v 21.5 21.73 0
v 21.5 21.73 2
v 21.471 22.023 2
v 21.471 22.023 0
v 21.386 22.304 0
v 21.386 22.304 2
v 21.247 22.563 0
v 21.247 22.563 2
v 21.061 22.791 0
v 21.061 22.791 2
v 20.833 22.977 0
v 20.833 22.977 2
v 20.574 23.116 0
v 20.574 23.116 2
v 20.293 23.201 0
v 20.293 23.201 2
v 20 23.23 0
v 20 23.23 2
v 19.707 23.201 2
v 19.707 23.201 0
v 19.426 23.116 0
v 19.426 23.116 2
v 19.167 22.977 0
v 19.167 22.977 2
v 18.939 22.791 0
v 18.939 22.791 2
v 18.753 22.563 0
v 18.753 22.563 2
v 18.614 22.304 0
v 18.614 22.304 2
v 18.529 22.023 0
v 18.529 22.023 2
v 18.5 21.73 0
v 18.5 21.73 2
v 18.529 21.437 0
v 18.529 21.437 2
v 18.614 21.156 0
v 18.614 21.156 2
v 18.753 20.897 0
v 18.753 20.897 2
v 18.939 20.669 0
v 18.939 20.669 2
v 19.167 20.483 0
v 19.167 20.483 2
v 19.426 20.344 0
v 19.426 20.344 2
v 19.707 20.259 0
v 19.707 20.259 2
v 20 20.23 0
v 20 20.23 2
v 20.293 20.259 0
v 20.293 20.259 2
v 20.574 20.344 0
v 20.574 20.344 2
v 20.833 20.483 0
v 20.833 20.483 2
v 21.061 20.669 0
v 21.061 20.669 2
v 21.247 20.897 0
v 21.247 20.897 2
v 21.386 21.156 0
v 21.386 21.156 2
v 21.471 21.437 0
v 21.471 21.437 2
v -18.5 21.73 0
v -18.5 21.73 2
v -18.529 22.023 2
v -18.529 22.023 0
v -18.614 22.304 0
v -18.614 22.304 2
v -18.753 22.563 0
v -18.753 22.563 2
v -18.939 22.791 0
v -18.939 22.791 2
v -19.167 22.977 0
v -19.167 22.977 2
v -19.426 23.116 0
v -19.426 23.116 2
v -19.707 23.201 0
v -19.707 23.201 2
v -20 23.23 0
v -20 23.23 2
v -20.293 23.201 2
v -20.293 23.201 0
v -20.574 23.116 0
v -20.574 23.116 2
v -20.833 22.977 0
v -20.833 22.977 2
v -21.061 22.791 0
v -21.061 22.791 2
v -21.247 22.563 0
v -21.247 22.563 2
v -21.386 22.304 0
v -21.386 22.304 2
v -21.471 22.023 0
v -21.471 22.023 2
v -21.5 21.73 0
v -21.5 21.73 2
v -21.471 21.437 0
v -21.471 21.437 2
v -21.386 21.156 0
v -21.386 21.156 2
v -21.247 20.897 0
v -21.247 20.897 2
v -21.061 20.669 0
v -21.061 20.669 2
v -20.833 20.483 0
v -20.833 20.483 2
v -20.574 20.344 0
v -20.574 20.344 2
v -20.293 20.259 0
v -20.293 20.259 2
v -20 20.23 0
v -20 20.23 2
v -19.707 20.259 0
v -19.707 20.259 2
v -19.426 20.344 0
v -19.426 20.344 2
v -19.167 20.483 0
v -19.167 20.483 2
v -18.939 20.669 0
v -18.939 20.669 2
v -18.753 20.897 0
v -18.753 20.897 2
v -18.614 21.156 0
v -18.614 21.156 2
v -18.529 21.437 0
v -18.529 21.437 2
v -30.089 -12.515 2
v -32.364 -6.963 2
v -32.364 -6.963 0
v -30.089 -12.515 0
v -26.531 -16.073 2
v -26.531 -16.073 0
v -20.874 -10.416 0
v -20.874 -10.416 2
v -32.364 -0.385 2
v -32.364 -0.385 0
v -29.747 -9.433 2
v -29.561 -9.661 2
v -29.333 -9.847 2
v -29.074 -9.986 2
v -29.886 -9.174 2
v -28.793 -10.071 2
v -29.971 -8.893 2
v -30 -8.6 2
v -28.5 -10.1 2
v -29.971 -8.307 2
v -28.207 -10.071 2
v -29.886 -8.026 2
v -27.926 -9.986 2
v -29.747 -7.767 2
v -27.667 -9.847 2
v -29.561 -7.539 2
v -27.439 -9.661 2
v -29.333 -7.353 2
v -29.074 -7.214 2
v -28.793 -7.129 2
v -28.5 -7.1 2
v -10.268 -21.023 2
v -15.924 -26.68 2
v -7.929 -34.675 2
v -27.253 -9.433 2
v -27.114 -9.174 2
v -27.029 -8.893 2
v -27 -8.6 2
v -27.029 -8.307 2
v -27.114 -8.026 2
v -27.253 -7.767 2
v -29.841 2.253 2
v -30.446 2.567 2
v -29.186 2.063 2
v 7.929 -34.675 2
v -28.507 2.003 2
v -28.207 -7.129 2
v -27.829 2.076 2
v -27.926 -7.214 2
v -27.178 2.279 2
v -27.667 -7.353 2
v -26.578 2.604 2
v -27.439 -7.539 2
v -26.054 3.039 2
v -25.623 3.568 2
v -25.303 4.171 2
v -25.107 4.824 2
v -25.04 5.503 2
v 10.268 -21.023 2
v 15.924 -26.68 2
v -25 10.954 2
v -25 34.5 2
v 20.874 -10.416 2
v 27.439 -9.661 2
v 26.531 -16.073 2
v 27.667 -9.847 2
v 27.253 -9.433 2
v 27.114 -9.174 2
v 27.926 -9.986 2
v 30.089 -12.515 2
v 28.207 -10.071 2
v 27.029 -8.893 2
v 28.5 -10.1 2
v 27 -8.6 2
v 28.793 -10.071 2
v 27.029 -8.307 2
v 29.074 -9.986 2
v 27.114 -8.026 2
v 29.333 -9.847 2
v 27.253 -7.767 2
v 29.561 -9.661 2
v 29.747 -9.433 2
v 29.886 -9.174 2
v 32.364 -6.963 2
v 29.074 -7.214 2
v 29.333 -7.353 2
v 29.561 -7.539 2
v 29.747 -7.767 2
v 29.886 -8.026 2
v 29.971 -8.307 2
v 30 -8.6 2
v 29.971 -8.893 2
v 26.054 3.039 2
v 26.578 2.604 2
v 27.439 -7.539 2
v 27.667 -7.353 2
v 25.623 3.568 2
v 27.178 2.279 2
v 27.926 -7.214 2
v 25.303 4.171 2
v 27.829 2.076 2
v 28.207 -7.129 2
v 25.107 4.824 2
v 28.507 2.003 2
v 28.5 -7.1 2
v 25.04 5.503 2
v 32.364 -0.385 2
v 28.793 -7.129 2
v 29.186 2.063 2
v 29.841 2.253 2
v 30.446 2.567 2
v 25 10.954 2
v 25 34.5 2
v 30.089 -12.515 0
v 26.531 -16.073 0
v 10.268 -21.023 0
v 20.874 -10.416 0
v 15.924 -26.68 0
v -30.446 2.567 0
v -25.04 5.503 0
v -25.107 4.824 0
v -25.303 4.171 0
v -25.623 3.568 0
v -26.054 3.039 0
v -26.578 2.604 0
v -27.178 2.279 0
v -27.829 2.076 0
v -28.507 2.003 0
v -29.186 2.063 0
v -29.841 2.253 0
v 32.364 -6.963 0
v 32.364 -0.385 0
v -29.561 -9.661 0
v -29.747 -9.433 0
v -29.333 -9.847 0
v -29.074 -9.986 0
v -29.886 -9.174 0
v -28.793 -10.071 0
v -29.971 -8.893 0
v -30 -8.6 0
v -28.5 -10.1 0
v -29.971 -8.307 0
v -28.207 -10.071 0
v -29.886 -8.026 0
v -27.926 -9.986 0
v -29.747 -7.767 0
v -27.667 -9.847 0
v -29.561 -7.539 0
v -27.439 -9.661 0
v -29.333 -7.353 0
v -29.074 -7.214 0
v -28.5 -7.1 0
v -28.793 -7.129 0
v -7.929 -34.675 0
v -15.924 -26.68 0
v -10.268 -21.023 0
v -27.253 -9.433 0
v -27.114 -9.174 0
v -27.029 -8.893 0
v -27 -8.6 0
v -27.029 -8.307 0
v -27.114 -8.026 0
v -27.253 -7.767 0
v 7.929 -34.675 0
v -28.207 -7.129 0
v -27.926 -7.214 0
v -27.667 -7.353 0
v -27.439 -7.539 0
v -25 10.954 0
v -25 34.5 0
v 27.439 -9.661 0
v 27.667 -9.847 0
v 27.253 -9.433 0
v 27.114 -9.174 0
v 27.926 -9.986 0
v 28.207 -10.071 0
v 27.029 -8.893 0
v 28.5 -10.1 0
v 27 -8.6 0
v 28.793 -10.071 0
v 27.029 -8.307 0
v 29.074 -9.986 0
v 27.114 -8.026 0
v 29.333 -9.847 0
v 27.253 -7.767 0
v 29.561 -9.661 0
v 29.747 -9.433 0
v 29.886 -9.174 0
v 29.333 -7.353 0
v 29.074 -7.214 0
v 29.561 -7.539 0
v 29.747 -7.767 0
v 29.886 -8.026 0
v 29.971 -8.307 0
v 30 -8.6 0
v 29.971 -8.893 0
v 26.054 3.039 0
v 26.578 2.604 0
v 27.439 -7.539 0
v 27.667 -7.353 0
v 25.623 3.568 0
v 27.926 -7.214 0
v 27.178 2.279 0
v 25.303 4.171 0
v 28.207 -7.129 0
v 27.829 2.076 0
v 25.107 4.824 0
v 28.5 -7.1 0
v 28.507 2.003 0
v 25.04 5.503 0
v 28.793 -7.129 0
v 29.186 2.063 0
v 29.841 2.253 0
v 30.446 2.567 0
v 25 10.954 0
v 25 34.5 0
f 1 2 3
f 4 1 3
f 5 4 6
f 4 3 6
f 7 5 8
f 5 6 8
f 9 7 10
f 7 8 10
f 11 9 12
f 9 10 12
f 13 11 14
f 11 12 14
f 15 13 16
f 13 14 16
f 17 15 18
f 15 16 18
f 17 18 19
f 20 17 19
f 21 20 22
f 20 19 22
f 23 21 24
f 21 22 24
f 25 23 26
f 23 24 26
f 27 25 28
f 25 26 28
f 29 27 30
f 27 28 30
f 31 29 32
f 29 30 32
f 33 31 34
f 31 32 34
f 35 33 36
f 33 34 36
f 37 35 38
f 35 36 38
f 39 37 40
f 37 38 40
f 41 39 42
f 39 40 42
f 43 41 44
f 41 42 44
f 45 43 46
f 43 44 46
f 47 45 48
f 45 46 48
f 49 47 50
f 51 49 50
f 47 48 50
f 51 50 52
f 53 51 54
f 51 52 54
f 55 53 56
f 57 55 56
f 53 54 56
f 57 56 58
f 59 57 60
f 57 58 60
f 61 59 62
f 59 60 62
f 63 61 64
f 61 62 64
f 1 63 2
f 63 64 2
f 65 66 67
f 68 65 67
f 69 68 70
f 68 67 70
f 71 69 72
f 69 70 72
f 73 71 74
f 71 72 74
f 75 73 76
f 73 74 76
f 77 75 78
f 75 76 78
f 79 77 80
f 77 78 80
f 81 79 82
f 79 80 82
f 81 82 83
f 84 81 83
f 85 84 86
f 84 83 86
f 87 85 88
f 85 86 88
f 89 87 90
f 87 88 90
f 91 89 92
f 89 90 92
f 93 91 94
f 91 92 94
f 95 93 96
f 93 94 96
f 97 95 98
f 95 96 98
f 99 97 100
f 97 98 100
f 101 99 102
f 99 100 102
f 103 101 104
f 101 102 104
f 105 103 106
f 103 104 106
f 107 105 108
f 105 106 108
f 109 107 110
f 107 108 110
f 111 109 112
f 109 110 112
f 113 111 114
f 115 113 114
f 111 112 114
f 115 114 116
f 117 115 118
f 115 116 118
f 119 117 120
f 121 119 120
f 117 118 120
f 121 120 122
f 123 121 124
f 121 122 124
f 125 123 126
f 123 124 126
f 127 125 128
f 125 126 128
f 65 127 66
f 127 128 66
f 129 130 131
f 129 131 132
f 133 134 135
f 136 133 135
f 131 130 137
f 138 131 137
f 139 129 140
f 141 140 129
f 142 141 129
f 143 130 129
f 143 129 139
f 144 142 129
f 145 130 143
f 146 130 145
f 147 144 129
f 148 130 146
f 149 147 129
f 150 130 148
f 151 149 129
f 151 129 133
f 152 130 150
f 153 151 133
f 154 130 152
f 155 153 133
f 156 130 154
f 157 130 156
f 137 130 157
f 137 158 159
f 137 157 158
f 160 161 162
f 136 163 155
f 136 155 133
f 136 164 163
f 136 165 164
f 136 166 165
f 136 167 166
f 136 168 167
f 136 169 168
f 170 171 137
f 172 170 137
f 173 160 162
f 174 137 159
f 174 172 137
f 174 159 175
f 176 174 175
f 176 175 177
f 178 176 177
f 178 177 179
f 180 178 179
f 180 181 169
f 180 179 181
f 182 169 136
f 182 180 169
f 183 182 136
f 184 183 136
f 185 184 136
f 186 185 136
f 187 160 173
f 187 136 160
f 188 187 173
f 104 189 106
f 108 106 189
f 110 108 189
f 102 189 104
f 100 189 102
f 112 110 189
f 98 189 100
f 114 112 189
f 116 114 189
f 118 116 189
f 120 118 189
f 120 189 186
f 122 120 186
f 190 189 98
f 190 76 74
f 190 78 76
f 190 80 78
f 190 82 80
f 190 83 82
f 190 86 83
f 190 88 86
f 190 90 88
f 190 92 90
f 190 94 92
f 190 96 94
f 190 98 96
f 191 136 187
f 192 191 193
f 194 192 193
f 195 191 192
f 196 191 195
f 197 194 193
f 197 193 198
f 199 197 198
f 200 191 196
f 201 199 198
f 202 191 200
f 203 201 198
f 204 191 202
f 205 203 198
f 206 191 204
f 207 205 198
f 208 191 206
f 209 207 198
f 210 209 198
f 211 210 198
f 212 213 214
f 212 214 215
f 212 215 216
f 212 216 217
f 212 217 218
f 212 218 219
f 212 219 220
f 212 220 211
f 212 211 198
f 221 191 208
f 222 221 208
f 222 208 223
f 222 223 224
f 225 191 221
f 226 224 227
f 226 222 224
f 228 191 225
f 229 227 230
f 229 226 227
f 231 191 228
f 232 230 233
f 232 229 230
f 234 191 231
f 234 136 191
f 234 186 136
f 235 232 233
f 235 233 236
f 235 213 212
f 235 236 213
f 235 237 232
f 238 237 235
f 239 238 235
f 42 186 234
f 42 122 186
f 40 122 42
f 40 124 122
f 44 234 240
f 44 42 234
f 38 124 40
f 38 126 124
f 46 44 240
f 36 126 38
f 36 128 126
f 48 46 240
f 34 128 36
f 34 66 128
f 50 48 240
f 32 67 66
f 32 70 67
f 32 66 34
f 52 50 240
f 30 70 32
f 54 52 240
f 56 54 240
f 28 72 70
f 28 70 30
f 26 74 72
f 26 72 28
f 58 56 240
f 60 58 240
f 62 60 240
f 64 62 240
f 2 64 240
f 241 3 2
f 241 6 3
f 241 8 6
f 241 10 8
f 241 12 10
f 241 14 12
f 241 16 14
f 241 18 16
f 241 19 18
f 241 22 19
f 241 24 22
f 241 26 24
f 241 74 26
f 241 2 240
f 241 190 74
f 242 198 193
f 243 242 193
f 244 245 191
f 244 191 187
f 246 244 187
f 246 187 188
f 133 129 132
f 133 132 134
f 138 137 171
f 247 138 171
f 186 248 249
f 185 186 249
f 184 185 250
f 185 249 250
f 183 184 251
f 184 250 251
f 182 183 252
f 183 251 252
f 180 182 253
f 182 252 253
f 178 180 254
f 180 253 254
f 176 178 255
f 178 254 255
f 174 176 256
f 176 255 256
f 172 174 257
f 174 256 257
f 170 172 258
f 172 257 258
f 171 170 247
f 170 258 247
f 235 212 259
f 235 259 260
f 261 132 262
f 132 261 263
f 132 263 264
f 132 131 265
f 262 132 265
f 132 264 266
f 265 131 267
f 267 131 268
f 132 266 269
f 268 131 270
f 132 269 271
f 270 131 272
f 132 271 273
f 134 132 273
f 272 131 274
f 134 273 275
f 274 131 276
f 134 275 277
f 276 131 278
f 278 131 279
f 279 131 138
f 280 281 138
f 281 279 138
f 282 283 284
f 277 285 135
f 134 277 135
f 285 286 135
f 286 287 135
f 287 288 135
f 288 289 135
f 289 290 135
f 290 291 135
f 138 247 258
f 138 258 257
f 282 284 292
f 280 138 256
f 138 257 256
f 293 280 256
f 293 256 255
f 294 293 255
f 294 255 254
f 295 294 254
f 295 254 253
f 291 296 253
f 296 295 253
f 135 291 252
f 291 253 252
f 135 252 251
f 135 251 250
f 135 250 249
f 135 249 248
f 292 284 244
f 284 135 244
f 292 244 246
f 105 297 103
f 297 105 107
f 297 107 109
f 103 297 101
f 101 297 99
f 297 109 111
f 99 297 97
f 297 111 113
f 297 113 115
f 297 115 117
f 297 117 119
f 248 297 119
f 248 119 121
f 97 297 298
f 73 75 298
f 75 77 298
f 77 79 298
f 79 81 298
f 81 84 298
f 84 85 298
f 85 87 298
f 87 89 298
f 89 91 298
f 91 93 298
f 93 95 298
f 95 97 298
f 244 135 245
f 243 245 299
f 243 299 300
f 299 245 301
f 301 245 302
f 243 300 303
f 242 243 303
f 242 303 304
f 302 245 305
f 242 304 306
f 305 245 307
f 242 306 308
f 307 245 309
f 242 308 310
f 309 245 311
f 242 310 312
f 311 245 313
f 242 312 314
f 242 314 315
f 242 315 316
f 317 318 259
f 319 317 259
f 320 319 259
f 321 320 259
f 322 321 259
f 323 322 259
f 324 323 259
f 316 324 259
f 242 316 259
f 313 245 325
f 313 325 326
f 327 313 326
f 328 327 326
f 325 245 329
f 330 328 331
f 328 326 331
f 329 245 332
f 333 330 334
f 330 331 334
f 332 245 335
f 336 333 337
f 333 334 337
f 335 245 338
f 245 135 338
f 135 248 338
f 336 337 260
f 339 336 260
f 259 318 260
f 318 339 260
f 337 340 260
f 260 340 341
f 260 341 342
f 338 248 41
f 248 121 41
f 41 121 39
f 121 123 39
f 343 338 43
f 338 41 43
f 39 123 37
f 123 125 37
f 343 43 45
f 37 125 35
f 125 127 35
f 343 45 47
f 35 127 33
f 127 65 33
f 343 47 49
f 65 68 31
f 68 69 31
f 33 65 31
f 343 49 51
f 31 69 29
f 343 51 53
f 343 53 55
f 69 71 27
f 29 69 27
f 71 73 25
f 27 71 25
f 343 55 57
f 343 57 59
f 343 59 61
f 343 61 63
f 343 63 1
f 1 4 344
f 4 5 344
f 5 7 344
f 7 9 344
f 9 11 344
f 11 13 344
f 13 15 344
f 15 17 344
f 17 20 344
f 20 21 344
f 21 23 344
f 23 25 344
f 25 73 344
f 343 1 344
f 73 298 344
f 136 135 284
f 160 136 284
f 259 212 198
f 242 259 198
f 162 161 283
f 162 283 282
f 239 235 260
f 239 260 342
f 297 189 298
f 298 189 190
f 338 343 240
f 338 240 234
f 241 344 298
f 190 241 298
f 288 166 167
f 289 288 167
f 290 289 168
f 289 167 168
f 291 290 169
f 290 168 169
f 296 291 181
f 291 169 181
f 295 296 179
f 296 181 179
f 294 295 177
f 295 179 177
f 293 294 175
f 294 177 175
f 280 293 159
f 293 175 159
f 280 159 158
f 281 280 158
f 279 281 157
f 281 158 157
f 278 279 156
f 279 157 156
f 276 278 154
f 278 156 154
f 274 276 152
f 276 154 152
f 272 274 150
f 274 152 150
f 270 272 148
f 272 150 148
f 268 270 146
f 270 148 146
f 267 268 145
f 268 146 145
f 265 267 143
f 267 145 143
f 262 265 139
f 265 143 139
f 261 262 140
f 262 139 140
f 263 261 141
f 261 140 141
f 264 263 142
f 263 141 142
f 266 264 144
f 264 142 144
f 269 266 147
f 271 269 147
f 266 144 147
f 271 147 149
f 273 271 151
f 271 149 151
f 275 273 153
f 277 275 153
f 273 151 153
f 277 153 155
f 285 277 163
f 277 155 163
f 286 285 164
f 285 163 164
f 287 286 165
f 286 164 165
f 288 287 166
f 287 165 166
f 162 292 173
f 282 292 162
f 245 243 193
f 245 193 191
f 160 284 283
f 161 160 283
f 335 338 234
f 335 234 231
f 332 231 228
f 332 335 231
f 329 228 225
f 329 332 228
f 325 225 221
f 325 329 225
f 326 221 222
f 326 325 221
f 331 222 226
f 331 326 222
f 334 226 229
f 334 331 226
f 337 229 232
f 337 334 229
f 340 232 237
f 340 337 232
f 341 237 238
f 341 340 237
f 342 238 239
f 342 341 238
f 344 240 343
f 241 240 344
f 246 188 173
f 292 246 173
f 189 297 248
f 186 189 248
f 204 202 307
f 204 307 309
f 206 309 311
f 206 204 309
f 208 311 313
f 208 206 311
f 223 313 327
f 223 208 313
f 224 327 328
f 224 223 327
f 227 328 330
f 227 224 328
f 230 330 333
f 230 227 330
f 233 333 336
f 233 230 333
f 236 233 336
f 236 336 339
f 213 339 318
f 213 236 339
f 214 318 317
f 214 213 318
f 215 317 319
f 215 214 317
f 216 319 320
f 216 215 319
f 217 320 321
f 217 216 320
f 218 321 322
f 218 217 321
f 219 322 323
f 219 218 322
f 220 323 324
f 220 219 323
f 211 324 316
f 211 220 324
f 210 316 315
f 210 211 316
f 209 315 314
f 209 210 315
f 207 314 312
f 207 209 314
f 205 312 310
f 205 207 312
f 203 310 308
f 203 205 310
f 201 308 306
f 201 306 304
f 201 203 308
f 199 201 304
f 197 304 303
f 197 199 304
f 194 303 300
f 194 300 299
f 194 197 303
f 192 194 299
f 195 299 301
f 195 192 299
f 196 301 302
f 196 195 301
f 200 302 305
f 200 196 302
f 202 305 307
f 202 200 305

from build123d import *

# Parameters (mm, degrees)
EXTRUDE1_DEPTH  = 2
SKETCH4_R       = 1.5
EXTRUDE3_DEPTH  = 2
EXTRUDE5_DEPTH  = 2
FILLET2_R       = 3
SKETCH7_R       = 1.5
EXTRUDE6_DEPTH  = 2
EXTRUDE7_DEPTH  = 2
EXTRUDE8_DEPTH  = 2
EXTRUDE9_DEPTH  = 2
EXTRUDE10_DEPTH = 2
EXTRUDE11_DEPTH = 2
SKETCH13_W      = 52.444820885
SKETCH13_H      = 24.426279397
EXTRUDE12_DEPTH = 2
SKETCH14_R      = 1.5
EXTRUDE13_DEPTH = 2
EXTRUDE14_DEPTH = 2
EXTRUDE15_DEPTH = 2
SKETCH17_W      = 50
SKETCH17_H      = 4
EXTRUDE17_DEPTH = 2


with BuildPart() as part:
    # Sketch1 → Extrude1 (new body)
    with BuildSketch(Plane.XY):
        Polygon((-15, 13.5), (-15, 38.5), (15, 38.5), (15, 13.5), (26.811651575, -4.688348425), (15, -16.5), (15, -26.5), (7.928932188, -33.571067812), (7.928932188, -52.571067812), (-7.928932188, -52.571067812), (-7.928932188, -33.571067812), (-15, -26.5), (-15, -16.5), (-26.811651575, -4.688348425), align=None)
    extrude(amount=EXTRUDE1_DEPTH)

    # Sketch4 → Extrude3 (add)
    with BuildSketch(Plane.XY.offset(2)):
        Polygon((-26.811651575, -4.688348425), (-32.363678884, -6.963209468), (-30.088817841, -12.515236776), (-22.212122569, -9.287877431), align=None)
        with Locations((-28.5, -8.6)):
            Circle(SKETCH4_R, mode=Mode.SUBTRACT)
    extrude3 = extrude(amount=-EXTRUDE3_DEPTH)

    # Mirror1: Extrude3 across plane
    add(extrude3.mirror(Plane(origin=(0, 0, 0), x_dir=(0, 0, 1), z_dir=(1, 0, 0))))

    # Sketch6 → Extrude5 (add)
    with BuildSketch(Plane.XY.offset(2)):
        Polygon((0, -44.571067812), (-7.928932188, -44.571067812), (-18, -54.642135624), (18, -54.642135624), (7.928932188, -44.571067812), align=None)
    extrude(amount=-EXTRUDE5_DEPTH)

    # Fillet2
    fillet2_edges = [part.edges().sort_by_distance(p)[0] for p in [
        (18, -54.642135624, 1),
        (-18, -54.642135624, 1),
    ]]
    fillet(fillet2_edges, radius=FILLET2_R)

    # Sketch7 → Extrude6 (cut)
    with BuildSketch(Plane.XY.offset(2)):
        with Locations((-11, -52.002135624)):
            Circle(SKETCH7_R)
    extrude6 = extrude(amount=-EXTRUDE6_DEPTH, mode=Mode.SUBTRACT)

    # Mirror4: Extrude6 across plane
    add(extrude6.mirror(Plane(origin=(0, 0, 0), x_dir=(0, 0, 1), z_dir=(1, 0, 0))), mode=Mode.SUBTRACT)

    # Sketch8 → Extrude7 (add)
    with BuildSketch(Plane.XY.offset(2)):
        Polygon((-26.811651575, -4.688348425), (-32.363678884, -6.963209468), (-32.363678884, -0.385171544), (-15, 26.352549211), (-15, 13.5), align=None)
    extrude7 = extrude(amount=-EXTRUDE7_DEPTH)

    # Sketch9 → Extrude8 (add)
    with BuildSketch(Plane.XY.offset(2)):
        Polygon((-22.212122569, -9.287877431), (-25.22165278, -10.520987907), (-15, -20.742640687), (-15, -16.5), align=None)
    extrude8 = extrude(amount=-EXTRUDE8_DEPTH)

    # Sketch10 → Extrude9 (add)
    with BuildSketch(Plane.XY.offset(2)):
        Polygon((-25.22165278, -10.520987907), (-30.088817841, -12.515236776), (-23.702612277, -18.90144234), (-20.271905312, -15.470735375), align=None)
    extrude9 = extrude(amount=-EXTRUDE9_DEPTH)

    # Sketch11 → Extrude10 (add)
    with BuildSketch(Plane.XY.offset(2)):
        Polygon((-15.322157844, -20.420482843), (-18.752864809, -23.851189808), (-7.928932188, -34.675122429), (-7.928932188, -33.571067812), (-15, -26.5), (-15, -20.742640687), align=None)
    extrude10 = extrude(amount=-EXTRUDE10_DEPTH)

    # Sketch12 → Extrude11 (add)
    with BuildSketch(Plane.XY.offset(2)):
        Polygon((-25, 10.953899573), (-25, 38.5), (-15, 38.5), (-15, 26.352549211), align=None)
    extrude11 = extrude(amount=-EXTRUDE11_DEPTH)

    # Mirror5: Extrude7, Extrude8, Extrude9, Extrude10 across plane
    add(extrude7.mirror(Plane(origin=(0, 0, 0), x_dir=(0, 0, 1), z_dir=(1, 0, 0))))
    add(extrude8.mirror(Plane(origin=(0, 0, 0), x_dir=(0, 0, 1), z_dir=(1, 0, 0))))
    add(extrude9.mirror(Plane(origin=(0, 0, 0), x_dir=(0, 0, 1), z_dir=(1, 0, 0))))
    add(extrude10.mirror(Plane(origin=(0, 0, 0), x_dir=(0, 0, 1), z_dir=(1, 0, 0))))

    # Mirror6: Extrude11 across plane
    add(extrude11.mirror(Plane(origin=(0, 0, 0), x_dir=(0, 0, 1), z_dir=(1, 0, 0))))

    # Sketch13 → Extrude12 (cut)
    with BuildSketch(Plane(origin=(0, 0, 0), x_dir=(-1, 0, 0), z_dir=(0, 0, -1))):
        with Locations((1.088066824, -46.888262128)):
            Rectangle(SKETCH13_W, SKETCH13_H)
    extrude(amount=-EXTRUDE12_DEPTH, mode=Mode.SUBTRACT)

    # Sketch14 → Extrude13 (cut)
    with BuildSketch(Plane.XY.offset(2)):
        with Locations((-20, 21.73)):
            Circle(SKETCH14_R)
        with Locations((20, 21.73)):
            Circle(SKETCH14_R)
    extrude(amount=-EXTRUDE13_DEPTH, mode=Mode.SUBTRACT)

    # Sketch15 → Extrude14 (cut)
    with BuildSketch(Plane(origin=(0, 0, 0), x_dir=(-1, 0, 0), z_dir=(0, 0, -1))):
        Polygon((26.531039402, -16.073015215), (20.874185152, -10.416160966), (10.267583435, -21.022762684), (15.924437684, -26.679616933), align=None)
        Polygon((-26.531039402, -16.073015215), (-20.874185152, -10.416160966), (-10.267583435, -21.022762684), (-15.924437684, -26.679616933), align=None)
    extrude(amount=-EXTRUDE14_DEPTH, mode=Mode.SUBTRACT)

    # Sketch16 → Extrude15 (cut)
    with BuildSketch(Plane(origin=(0, 0, 0), x_dir=(-1, 0, 0), z_dir=(0, 0, -1))):
        with BuildLine():
            Line((-25, 10.953899573), (-25.040153728, 5.502540882))
            ThreePointArc((-25.040153728, 5.502540882), (-26.870098067, 2.426680987), (-30.44639035, 2.567193894))
            Line((-30.44639035, 2.567193894), (-25, 10.953899573))
        make_face()
        with BuildLine():
            Line((25, 10.953899573), (25.040153728, 5.502540882))
            ThreePointArc((25.040153728, 5.502540882), (26.870098067, 2.426680987), (30.44639035, 2.567193894))
            Line((30.44639035, 2.567193894), (25, 10.953899573))
        make_face()
    extrude(amount=-EXTRUDE15_DEPTH, mode=Mode.SUBTRACT)

    # Sketch17 → Extrude17 (cut)
    with BuildSketch(Plane(origin=(0, 0, 0), x_dir=(-1, 0, 0), z_dir=(0, 0, -1))):
        with Locations((0, 36.5)):
            Rectangle(SKETCH17_W, SKETCH17_H)
    extrude(amount=-EXTRUDE17_DEPTH, mode=Mode.SUBTRACT)


solid = part.part
